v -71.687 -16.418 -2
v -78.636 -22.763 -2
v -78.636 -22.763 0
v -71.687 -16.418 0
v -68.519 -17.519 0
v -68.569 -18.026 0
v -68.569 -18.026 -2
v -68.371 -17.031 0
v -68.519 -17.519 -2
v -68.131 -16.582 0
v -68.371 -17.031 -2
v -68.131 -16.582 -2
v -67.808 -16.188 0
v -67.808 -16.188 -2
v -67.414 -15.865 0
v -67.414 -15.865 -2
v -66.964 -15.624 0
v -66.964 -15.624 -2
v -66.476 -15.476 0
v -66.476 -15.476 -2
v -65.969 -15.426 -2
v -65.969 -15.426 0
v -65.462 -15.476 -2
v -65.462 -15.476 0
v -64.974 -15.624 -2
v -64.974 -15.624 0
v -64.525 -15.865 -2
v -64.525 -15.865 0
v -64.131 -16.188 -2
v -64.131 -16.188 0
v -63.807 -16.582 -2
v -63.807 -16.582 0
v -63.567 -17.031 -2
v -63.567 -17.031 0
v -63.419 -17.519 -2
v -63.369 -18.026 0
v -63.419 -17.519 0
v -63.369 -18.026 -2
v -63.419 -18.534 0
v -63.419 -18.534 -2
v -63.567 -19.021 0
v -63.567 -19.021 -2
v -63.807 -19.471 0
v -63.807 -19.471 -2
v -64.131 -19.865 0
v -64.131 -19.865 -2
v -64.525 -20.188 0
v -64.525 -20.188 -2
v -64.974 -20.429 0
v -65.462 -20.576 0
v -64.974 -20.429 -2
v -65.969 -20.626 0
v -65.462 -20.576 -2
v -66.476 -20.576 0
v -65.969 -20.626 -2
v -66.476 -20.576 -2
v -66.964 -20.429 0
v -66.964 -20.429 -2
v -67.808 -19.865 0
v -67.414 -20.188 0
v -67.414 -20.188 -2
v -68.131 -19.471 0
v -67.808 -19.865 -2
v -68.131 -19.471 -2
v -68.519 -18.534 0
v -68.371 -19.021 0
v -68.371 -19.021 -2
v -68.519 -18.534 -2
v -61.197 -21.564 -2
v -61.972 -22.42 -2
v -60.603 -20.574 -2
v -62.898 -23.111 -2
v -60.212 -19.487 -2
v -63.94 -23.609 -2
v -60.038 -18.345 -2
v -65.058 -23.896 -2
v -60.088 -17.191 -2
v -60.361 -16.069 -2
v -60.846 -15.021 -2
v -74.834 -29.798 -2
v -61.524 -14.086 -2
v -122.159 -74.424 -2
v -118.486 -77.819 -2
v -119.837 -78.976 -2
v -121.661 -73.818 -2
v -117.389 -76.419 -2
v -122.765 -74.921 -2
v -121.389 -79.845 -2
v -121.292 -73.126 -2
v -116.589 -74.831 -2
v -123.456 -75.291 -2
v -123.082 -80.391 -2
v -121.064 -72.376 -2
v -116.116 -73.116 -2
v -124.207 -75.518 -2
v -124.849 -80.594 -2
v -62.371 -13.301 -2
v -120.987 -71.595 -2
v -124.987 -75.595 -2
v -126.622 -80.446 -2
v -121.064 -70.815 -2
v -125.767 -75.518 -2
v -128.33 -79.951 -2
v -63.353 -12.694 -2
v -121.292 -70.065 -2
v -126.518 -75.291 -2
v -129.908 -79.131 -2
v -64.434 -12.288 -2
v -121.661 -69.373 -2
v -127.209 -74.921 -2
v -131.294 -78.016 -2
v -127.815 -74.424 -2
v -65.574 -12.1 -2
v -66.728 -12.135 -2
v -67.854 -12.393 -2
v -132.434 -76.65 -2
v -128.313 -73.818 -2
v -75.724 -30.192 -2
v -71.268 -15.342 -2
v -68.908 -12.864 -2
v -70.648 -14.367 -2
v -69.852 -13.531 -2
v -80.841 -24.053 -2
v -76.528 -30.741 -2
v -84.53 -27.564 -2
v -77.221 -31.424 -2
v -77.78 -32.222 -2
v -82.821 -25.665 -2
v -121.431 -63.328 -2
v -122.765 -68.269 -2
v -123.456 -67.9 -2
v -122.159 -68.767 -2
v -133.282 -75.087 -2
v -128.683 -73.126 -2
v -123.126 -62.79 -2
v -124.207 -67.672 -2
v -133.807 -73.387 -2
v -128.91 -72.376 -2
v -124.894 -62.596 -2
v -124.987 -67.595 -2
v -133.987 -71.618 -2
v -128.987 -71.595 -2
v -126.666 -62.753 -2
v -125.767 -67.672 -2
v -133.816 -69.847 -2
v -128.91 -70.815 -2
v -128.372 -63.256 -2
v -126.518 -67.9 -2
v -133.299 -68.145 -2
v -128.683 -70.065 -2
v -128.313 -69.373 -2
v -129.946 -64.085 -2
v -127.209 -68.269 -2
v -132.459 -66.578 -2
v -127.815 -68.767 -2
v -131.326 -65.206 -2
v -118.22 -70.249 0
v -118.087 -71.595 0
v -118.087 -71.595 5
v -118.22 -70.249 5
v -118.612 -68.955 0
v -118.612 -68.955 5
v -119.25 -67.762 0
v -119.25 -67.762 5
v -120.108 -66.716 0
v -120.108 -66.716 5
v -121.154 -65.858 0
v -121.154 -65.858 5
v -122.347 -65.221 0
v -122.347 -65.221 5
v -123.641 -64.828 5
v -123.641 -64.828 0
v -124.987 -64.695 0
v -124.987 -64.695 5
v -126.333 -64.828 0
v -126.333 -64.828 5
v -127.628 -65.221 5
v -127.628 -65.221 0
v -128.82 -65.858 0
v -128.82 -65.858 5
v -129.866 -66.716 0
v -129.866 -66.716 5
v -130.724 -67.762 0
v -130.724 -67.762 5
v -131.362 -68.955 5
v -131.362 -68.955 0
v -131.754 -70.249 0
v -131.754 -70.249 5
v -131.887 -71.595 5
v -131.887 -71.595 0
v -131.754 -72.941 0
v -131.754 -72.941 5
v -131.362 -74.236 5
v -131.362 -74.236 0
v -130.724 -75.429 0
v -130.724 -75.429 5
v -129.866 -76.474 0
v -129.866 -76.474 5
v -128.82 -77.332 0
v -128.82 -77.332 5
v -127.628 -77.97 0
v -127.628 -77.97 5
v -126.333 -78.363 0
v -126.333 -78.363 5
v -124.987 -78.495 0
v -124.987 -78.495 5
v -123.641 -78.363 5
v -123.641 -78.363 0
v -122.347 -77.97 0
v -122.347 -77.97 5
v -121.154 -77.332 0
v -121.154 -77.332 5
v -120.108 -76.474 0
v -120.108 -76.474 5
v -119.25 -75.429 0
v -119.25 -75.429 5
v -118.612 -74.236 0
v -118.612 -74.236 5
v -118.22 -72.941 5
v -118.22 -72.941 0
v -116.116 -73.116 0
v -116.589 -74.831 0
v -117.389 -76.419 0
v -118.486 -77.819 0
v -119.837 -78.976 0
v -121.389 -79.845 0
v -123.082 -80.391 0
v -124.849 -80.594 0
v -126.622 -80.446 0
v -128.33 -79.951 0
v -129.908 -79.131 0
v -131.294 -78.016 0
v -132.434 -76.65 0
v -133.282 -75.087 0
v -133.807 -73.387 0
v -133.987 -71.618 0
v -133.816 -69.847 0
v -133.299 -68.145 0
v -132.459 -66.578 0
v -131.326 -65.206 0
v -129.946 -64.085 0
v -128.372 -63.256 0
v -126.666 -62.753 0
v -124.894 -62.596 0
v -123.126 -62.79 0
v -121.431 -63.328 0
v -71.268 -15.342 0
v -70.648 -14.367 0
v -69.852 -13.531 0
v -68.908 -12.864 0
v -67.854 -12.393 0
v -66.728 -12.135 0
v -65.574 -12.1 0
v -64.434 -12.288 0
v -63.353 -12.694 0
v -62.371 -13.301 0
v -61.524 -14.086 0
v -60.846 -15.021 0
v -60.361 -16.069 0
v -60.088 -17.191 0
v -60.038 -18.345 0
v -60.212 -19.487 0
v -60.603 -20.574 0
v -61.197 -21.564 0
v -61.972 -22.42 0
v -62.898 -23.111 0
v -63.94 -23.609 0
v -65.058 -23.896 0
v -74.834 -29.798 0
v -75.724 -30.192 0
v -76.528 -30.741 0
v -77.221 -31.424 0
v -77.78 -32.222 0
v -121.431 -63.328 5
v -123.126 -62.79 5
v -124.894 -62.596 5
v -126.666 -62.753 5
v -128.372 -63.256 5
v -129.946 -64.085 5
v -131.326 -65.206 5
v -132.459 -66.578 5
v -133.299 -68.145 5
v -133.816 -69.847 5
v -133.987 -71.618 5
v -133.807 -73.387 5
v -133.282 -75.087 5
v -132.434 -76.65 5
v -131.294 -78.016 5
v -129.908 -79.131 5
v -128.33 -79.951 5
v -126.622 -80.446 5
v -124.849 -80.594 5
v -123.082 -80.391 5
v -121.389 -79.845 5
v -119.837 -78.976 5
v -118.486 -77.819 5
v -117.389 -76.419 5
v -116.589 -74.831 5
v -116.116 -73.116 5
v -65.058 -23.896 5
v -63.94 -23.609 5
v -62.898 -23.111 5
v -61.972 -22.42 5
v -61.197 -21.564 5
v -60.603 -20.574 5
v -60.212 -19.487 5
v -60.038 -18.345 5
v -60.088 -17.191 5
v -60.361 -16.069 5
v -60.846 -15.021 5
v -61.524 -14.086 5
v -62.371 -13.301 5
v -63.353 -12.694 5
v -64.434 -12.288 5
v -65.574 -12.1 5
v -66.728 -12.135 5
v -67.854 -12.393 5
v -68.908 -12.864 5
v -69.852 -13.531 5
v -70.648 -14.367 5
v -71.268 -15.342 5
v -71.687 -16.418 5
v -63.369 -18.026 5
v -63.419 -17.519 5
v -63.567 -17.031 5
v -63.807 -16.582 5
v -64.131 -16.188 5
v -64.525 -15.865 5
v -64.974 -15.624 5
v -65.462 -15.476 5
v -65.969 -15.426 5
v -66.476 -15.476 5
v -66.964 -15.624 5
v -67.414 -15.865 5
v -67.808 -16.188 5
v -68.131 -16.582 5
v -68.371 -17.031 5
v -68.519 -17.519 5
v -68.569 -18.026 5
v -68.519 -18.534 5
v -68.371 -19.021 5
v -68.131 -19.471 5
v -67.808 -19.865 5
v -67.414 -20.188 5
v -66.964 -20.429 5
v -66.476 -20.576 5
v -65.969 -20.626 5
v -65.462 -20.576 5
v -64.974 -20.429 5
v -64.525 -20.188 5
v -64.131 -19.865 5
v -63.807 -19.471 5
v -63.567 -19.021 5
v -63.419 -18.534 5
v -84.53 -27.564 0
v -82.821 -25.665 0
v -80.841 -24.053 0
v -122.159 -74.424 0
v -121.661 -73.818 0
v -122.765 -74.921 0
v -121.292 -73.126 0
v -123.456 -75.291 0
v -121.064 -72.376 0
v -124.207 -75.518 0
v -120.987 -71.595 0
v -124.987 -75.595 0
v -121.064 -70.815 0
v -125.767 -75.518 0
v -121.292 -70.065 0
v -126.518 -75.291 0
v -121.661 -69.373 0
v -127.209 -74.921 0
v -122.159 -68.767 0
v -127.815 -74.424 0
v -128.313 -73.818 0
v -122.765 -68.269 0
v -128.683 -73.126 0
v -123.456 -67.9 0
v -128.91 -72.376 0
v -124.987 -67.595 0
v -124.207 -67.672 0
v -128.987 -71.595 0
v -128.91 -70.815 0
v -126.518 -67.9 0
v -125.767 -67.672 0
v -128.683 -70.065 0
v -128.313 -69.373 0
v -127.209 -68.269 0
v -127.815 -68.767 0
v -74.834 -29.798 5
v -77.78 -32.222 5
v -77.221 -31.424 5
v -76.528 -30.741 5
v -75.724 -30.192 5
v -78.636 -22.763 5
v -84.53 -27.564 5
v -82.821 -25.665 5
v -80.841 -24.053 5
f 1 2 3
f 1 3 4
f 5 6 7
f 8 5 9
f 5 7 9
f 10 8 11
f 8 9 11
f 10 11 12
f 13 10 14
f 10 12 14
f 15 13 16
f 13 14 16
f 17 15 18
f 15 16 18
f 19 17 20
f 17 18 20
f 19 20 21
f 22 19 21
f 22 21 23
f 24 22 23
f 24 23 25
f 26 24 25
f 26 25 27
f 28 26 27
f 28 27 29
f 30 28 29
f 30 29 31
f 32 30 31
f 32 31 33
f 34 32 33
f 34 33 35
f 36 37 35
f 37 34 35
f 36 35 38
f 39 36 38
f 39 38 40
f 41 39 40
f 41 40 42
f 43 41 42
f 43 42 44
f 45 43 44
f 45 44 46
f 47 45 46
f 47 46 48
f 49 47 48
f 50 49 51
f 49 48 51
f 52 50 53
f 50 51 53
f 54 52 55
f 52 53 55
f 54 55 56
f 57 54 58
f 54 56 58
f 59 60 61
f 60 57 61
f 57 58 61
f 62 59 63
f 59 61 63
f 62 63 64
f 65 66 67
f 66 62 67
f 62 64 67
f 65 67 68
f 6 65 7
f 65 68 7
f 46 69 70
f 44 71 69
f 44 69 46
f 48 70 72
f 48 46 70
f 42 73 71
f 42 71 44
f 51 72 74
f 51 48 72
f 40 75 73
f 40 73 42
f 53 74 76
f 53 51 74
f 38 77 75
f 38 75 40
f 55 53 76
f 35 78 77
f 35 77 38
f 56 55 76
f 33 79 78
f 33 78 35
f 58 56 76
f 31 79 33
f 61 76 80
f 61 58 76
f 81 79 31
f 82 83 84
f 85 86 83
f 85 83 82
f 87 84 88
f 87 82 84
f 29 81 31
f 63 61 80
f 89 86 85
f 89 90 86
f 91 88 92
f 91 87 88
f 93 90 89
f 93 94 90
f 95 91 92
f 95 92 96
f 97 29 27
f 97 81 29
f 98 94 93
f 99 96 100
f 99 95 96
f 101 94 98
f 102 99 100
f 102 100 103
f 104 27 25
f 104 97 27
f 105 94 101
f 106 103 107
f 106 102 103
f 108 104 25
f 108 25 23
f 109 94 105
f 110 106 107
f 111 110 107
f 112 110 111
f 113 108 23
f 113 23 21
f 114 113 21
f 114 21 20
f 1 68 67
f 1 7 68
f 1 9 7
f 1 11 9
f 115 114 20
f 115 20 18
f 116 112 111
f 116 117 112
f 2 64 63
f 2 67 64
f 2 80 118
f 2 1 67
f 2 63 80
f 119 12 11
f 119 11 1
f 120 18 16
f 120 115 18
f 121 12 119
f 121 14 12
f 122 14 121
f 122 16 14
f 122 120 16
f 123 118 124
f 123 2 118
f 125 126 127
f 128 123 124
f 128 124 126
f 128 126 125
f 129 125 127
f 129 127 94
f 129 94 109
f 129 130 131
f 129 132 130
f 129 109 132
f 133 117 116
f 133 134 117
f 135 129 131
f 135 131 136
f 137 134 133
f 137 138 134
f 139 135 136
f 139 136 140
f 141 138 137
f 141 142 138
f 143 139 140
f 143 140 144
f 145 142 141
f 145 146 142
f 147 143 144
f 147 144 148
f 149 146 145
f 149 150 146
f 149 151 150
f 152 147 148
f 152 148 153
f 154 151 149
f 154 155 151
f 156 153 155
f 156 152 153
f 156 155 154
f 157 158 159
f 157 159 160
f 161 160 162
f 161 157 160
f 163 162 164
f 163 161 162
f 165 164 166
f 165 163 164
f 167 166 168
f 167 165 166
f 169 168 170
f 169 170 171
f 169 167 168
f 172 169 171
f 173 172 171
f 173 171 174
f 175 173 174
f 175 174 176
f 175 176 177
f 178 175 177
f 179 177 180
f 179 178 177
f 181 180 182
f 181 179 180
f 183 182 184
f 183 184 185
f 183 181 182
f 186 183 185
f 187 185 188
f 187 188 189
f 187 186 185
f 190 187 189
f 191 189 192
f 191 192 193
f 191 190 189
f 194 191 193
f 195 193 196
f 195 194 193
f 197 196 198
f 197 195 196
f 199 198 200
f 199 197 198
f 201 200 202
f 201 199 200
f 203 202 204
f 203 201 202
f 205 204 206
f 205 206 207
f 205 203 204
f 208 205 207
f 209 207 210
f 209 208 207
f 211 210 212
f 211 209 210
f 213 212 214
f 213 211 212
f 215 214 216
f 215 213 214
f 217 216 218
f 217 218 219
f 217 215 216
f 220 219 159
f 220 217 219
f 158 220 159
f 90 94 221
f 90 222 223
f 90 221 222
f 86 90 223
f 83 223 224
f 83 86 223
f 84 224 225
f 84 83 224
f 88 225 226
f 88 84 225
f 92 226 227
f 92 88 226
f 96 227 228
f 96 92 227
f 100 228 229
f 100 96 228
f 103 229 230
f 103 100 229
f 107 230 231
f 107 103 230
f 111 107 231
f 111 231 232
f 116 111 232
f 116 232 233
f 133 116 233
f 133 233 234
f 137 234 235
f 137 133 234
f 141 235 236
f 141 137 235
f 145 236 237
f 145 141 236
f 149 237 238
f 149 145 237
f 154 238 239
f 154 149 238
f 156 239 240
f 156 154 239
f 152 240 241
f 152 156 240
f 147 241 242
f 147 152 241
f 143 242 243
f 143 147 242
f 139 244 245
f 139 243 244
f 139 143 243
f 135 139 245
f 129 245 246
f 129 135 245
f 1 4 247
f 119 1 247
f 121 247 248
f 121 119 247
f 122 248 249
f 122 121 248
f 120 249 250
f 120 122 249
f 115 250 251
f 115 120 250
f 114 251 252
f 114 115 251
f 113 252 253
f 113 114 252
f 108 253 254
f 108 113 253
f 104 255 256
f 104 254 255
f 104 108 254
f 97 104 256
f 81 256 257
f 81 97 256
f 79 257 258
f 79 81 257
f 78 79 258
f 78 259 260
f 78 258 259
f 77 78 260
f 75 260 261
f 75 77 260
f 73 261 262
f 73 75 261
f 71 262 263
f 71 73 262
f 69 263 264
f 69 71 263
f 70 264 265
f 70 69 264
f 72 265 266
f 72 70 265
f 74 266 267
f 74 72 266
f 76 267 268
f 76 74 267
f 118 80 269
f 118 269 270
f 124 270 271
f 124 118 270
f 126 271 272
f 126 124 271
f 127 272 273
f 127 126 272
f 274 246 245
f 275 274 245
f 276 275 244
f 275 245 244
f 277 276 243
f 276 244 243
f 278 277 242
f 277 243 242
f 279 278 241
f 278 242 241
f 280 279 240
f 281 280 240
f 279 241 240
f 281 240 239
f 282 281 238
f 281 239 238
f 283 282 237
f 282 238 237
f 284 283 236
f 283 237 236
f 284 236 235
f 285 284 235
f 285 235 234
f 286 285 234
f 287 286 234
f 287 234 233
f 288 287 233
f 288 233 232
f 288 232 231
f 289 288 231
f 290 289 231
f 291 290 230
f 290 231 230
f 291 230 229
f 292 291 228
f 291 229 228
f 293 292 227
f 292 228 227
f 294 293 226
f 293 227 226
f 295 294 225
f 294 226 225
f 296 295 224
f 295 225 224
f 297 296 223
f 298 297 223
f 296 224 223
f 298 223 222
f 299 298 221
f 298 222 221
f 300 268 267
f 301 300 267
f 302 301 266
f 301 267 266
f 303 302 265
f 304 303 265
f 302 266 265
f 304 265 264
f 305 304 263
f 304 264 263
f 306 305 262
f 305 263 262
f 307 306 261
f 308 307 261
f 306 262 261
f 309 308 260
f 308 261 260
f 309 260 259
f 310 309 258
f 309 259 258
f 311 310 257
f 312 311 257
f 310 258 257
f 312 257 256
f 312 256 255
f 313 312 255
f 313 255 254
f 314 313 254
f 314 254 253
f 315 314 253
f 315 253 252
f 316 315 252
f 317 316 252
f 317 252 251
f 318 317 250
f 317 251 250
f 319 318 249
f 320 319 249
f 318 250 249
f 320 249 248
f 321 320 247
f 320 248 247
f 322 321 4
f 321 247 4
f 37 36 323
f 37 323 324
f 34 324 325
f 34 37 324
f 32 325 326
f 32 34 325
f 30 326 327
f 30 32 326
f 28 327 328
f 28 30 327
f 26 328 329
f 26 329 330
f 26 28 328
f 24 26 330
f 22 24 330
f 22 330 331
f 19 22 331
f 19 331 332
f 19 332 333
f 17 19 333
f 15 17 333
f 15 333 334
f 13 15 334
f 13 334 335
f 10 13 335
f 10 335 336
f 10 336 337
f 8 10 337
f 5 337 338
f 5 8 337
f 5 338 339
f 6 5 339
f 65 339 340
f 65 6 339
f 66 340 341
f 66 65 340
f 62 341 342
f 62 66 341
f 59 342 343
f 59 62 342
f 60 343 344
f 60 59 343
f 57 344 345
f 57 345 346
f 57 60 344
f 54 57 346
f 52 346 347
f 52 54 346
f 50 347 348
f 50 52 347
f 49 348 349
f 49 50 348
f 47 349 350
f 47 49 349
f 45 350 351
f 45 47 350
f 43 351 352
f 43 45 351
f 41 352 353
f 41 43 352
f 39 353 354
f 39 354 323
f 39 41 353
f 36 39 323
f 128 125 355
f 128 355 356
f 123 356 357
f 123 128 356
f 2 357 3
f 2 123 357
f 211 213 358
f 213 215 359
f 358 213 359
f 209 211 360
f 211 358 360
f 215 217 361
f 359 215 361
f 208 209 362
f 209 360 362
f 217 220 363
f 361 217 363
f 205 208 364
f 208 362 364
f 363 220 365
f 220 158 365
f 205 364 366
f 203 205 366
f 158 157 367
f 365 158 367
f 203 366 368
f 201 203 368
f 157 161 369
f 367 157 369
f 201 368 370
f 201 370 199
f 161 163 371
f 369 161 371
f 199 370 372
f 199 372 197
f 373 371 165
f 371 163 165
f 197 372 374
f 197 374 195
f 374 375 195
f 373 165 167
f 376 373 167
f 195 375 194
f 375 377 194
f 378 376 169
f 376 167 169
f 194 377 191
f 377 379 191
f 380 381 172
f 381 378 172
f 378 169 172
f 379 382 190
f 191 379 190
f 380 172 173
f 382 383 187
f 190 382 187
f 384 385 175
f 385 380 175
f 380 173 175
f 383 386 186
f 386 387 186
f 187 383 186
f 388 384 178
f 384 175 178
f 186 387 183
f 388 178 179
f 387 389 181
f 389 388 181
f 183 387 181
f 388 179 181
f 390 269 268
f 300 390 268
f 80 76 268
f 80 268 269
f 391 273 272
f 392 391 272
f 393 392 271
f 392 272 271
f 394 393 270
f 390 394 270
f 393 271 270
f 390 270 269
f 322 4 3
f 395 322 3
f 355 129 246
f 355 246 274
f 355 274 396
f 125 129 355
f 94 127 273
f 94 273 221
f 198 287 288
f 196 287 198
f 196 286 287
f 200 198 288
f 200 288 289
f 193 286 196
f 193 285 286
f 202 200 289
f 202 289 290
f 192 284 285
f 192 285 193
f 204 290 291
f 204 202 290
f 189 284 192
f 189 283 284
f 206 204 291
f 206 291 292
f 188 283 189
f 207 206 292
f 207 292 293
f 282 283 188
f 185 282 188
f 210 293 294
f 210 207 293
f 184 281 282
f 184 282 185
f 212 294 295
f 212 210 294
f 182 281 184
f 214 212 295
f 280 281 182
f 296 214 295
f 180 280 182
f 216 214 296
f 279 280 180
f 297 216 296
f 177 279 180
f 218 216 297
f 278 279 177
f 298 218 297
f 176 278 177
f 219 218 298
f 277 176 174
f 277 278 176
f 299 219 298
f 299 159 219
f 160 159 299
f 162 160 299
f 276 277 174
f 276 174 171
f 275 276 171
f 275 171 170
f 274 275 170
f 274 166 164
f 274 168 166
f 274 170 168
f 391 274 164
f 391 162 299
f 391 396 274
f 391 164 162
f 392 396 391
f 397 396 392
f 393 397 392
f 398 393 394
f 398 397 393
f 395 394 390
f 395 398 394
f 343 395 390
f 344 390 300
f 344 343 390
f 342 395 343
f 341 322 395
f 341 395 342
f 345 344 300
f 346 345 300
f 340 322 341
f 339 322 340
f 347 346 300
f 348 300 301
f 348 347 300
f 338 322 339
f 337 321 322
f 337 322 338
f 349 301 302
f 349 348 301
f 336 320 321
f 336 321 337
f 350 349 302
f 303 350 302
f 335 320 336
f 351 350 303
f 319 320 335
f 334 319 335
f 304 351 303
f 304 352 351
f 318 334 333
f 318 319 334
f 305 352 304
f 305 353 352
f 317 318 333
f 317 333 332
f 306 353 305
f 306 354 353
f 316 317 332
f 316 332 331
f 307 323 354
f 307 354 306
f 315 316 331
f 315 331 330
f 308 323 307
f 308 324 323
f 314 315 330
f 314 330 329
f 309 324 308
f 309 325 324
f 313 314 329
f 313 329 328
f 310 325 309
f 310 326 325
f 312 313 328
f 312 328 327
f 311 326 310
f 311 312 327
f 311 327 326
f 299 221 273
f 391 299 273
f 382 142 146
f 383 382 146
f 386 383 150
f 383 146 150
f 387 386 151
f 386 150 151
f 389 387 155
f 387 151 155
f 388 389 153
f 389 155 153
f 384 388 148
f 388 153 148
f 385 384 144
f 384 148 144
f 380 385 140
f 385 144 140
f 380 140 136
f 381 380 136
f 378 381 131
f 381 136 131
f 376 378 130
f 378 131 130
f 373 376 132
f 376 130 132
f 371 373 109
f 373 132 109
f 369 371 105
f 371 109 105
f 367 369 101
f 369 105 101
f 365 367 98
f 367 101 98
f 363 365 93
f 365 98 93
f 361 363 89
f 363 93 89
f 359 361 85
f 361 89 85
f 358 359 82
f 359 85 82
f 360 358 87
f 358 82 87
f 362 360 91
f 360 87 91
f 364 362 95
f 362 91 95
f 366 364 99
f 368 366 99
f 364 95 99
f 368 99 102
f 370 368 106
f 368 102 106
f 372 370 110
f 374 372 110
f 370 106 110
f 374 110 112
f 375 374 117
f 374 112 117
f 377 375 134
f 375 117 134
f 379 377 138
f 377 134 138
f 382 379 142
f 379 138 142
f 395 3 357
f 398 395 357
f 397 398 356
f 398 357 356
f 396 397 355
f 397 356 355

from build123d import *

# Parameters (mm, degrees)
SKETCH1_R           = 2.6
SKETCH1_R_2         = 6.9
BOSS_EXTRUDE1_DEPTH = 5
BOSS_EXTRUDE2_START = 2
SKETCH2_R           = 4
SKETCH2_R_2         = 2.6
BOSS_EXTRUDE2_DEPTH = 2


with BuildPart() as part:
    # Sketch1 → Boss-Extrude1 (new body)
    with BuildSketch(Plane.XY):
        with BuildLine():
            Line((-116.116459466, -73.116163472), (-77.780395614, -32.221656848))
            ThreePointArc((-77.780395614, -32.221656848), (-76.528201342, -30.740668075), (-74.833515464, -29.797610273))
            Line((-74.833515464, -29.797610273), (-65.058269204, -23.896184603))
            ThreePointArc((-65.058269204, -23.896184603), (-61.52405595, -14.086356432), (-71.687164611, -16.417582375))
            Line((-71.687164611, -16.417582375), (-78.635941465, -22.763122171))
            ThreePointArc((-78.635941465, -22.763122171), (-81.861894444, -24.820779517), (-84.529701766, -27.563684997))
            Line((-84.529701766, -27.563684997), (-121.430579381, -63.327828505))
            ThreePointArc((-121.430579381, -63.327828505), (-132.896560675, -75.889442497), (-116.116459466, -73.116163472))
        make_face()
        with Locations((-65.969197132, -18.026447785)):
            Circle(SKETCH1_R, mode=Mode.SUBTRACT)
        with Locations((-124.987033061, -71.595333402)):
            Circle(SKETCH1_R_2, mode=Mode.SUBTRACT)
    extrude(amount=BOSS_EXTRUDE1_DEPTH)

    # Sketch2 → Boss-Extrude2 (add)
    with BuildSketch(Plane(origin=(0, 0, 0), x_dir=(-1, 0, 0), z_dir=(0, 0, -1)).offset(BOSS_EXTRUDE2_START)):
        with BuildLine():
            Line((121.430579381, -63.327828505), (84.529701766, -27.563684997))
            ThreePointArc((84.529701766, -27.563684997), (81.861894444, -24.820779517), (78.635941465, -22.763122171))
            Line((78.635941465, -22.763122171), (71.687164611, -16.417582375))
            ThreePointArc((71.687164611, -16.417582375), (61.52405595, -14.086356432), (65.058269204, -23.896184603))
            Line((65.058269204, -23.896184603), (74.833515464, -29.797610273))
            ThreePointArc((74.833515464, -29.797610273), (76.528201342, -30.740668075), (77.780395614, -32.221656848))
            Line((77.780395614, -32.221656848), (116.116459466, -73.116163472))
            ThreePointArc((116.116459466, -73.116163472), (132.896560675, -75.889442497), (121.430579381, -63.327828505))
        make_face()
        with Locations((124.987033061, -71.595333402)):
            Circle(SKETCH2_R, mode=Mode.SUBTRACT)
        with Locations((65.969197132, -18.026447785)):
            Circle(SKETCH2_R_2, mode=Mode.SUBTRACT)
    extrude(amount=-BOSS_EXTRUDE2_DEPTH)


solid = part.part
